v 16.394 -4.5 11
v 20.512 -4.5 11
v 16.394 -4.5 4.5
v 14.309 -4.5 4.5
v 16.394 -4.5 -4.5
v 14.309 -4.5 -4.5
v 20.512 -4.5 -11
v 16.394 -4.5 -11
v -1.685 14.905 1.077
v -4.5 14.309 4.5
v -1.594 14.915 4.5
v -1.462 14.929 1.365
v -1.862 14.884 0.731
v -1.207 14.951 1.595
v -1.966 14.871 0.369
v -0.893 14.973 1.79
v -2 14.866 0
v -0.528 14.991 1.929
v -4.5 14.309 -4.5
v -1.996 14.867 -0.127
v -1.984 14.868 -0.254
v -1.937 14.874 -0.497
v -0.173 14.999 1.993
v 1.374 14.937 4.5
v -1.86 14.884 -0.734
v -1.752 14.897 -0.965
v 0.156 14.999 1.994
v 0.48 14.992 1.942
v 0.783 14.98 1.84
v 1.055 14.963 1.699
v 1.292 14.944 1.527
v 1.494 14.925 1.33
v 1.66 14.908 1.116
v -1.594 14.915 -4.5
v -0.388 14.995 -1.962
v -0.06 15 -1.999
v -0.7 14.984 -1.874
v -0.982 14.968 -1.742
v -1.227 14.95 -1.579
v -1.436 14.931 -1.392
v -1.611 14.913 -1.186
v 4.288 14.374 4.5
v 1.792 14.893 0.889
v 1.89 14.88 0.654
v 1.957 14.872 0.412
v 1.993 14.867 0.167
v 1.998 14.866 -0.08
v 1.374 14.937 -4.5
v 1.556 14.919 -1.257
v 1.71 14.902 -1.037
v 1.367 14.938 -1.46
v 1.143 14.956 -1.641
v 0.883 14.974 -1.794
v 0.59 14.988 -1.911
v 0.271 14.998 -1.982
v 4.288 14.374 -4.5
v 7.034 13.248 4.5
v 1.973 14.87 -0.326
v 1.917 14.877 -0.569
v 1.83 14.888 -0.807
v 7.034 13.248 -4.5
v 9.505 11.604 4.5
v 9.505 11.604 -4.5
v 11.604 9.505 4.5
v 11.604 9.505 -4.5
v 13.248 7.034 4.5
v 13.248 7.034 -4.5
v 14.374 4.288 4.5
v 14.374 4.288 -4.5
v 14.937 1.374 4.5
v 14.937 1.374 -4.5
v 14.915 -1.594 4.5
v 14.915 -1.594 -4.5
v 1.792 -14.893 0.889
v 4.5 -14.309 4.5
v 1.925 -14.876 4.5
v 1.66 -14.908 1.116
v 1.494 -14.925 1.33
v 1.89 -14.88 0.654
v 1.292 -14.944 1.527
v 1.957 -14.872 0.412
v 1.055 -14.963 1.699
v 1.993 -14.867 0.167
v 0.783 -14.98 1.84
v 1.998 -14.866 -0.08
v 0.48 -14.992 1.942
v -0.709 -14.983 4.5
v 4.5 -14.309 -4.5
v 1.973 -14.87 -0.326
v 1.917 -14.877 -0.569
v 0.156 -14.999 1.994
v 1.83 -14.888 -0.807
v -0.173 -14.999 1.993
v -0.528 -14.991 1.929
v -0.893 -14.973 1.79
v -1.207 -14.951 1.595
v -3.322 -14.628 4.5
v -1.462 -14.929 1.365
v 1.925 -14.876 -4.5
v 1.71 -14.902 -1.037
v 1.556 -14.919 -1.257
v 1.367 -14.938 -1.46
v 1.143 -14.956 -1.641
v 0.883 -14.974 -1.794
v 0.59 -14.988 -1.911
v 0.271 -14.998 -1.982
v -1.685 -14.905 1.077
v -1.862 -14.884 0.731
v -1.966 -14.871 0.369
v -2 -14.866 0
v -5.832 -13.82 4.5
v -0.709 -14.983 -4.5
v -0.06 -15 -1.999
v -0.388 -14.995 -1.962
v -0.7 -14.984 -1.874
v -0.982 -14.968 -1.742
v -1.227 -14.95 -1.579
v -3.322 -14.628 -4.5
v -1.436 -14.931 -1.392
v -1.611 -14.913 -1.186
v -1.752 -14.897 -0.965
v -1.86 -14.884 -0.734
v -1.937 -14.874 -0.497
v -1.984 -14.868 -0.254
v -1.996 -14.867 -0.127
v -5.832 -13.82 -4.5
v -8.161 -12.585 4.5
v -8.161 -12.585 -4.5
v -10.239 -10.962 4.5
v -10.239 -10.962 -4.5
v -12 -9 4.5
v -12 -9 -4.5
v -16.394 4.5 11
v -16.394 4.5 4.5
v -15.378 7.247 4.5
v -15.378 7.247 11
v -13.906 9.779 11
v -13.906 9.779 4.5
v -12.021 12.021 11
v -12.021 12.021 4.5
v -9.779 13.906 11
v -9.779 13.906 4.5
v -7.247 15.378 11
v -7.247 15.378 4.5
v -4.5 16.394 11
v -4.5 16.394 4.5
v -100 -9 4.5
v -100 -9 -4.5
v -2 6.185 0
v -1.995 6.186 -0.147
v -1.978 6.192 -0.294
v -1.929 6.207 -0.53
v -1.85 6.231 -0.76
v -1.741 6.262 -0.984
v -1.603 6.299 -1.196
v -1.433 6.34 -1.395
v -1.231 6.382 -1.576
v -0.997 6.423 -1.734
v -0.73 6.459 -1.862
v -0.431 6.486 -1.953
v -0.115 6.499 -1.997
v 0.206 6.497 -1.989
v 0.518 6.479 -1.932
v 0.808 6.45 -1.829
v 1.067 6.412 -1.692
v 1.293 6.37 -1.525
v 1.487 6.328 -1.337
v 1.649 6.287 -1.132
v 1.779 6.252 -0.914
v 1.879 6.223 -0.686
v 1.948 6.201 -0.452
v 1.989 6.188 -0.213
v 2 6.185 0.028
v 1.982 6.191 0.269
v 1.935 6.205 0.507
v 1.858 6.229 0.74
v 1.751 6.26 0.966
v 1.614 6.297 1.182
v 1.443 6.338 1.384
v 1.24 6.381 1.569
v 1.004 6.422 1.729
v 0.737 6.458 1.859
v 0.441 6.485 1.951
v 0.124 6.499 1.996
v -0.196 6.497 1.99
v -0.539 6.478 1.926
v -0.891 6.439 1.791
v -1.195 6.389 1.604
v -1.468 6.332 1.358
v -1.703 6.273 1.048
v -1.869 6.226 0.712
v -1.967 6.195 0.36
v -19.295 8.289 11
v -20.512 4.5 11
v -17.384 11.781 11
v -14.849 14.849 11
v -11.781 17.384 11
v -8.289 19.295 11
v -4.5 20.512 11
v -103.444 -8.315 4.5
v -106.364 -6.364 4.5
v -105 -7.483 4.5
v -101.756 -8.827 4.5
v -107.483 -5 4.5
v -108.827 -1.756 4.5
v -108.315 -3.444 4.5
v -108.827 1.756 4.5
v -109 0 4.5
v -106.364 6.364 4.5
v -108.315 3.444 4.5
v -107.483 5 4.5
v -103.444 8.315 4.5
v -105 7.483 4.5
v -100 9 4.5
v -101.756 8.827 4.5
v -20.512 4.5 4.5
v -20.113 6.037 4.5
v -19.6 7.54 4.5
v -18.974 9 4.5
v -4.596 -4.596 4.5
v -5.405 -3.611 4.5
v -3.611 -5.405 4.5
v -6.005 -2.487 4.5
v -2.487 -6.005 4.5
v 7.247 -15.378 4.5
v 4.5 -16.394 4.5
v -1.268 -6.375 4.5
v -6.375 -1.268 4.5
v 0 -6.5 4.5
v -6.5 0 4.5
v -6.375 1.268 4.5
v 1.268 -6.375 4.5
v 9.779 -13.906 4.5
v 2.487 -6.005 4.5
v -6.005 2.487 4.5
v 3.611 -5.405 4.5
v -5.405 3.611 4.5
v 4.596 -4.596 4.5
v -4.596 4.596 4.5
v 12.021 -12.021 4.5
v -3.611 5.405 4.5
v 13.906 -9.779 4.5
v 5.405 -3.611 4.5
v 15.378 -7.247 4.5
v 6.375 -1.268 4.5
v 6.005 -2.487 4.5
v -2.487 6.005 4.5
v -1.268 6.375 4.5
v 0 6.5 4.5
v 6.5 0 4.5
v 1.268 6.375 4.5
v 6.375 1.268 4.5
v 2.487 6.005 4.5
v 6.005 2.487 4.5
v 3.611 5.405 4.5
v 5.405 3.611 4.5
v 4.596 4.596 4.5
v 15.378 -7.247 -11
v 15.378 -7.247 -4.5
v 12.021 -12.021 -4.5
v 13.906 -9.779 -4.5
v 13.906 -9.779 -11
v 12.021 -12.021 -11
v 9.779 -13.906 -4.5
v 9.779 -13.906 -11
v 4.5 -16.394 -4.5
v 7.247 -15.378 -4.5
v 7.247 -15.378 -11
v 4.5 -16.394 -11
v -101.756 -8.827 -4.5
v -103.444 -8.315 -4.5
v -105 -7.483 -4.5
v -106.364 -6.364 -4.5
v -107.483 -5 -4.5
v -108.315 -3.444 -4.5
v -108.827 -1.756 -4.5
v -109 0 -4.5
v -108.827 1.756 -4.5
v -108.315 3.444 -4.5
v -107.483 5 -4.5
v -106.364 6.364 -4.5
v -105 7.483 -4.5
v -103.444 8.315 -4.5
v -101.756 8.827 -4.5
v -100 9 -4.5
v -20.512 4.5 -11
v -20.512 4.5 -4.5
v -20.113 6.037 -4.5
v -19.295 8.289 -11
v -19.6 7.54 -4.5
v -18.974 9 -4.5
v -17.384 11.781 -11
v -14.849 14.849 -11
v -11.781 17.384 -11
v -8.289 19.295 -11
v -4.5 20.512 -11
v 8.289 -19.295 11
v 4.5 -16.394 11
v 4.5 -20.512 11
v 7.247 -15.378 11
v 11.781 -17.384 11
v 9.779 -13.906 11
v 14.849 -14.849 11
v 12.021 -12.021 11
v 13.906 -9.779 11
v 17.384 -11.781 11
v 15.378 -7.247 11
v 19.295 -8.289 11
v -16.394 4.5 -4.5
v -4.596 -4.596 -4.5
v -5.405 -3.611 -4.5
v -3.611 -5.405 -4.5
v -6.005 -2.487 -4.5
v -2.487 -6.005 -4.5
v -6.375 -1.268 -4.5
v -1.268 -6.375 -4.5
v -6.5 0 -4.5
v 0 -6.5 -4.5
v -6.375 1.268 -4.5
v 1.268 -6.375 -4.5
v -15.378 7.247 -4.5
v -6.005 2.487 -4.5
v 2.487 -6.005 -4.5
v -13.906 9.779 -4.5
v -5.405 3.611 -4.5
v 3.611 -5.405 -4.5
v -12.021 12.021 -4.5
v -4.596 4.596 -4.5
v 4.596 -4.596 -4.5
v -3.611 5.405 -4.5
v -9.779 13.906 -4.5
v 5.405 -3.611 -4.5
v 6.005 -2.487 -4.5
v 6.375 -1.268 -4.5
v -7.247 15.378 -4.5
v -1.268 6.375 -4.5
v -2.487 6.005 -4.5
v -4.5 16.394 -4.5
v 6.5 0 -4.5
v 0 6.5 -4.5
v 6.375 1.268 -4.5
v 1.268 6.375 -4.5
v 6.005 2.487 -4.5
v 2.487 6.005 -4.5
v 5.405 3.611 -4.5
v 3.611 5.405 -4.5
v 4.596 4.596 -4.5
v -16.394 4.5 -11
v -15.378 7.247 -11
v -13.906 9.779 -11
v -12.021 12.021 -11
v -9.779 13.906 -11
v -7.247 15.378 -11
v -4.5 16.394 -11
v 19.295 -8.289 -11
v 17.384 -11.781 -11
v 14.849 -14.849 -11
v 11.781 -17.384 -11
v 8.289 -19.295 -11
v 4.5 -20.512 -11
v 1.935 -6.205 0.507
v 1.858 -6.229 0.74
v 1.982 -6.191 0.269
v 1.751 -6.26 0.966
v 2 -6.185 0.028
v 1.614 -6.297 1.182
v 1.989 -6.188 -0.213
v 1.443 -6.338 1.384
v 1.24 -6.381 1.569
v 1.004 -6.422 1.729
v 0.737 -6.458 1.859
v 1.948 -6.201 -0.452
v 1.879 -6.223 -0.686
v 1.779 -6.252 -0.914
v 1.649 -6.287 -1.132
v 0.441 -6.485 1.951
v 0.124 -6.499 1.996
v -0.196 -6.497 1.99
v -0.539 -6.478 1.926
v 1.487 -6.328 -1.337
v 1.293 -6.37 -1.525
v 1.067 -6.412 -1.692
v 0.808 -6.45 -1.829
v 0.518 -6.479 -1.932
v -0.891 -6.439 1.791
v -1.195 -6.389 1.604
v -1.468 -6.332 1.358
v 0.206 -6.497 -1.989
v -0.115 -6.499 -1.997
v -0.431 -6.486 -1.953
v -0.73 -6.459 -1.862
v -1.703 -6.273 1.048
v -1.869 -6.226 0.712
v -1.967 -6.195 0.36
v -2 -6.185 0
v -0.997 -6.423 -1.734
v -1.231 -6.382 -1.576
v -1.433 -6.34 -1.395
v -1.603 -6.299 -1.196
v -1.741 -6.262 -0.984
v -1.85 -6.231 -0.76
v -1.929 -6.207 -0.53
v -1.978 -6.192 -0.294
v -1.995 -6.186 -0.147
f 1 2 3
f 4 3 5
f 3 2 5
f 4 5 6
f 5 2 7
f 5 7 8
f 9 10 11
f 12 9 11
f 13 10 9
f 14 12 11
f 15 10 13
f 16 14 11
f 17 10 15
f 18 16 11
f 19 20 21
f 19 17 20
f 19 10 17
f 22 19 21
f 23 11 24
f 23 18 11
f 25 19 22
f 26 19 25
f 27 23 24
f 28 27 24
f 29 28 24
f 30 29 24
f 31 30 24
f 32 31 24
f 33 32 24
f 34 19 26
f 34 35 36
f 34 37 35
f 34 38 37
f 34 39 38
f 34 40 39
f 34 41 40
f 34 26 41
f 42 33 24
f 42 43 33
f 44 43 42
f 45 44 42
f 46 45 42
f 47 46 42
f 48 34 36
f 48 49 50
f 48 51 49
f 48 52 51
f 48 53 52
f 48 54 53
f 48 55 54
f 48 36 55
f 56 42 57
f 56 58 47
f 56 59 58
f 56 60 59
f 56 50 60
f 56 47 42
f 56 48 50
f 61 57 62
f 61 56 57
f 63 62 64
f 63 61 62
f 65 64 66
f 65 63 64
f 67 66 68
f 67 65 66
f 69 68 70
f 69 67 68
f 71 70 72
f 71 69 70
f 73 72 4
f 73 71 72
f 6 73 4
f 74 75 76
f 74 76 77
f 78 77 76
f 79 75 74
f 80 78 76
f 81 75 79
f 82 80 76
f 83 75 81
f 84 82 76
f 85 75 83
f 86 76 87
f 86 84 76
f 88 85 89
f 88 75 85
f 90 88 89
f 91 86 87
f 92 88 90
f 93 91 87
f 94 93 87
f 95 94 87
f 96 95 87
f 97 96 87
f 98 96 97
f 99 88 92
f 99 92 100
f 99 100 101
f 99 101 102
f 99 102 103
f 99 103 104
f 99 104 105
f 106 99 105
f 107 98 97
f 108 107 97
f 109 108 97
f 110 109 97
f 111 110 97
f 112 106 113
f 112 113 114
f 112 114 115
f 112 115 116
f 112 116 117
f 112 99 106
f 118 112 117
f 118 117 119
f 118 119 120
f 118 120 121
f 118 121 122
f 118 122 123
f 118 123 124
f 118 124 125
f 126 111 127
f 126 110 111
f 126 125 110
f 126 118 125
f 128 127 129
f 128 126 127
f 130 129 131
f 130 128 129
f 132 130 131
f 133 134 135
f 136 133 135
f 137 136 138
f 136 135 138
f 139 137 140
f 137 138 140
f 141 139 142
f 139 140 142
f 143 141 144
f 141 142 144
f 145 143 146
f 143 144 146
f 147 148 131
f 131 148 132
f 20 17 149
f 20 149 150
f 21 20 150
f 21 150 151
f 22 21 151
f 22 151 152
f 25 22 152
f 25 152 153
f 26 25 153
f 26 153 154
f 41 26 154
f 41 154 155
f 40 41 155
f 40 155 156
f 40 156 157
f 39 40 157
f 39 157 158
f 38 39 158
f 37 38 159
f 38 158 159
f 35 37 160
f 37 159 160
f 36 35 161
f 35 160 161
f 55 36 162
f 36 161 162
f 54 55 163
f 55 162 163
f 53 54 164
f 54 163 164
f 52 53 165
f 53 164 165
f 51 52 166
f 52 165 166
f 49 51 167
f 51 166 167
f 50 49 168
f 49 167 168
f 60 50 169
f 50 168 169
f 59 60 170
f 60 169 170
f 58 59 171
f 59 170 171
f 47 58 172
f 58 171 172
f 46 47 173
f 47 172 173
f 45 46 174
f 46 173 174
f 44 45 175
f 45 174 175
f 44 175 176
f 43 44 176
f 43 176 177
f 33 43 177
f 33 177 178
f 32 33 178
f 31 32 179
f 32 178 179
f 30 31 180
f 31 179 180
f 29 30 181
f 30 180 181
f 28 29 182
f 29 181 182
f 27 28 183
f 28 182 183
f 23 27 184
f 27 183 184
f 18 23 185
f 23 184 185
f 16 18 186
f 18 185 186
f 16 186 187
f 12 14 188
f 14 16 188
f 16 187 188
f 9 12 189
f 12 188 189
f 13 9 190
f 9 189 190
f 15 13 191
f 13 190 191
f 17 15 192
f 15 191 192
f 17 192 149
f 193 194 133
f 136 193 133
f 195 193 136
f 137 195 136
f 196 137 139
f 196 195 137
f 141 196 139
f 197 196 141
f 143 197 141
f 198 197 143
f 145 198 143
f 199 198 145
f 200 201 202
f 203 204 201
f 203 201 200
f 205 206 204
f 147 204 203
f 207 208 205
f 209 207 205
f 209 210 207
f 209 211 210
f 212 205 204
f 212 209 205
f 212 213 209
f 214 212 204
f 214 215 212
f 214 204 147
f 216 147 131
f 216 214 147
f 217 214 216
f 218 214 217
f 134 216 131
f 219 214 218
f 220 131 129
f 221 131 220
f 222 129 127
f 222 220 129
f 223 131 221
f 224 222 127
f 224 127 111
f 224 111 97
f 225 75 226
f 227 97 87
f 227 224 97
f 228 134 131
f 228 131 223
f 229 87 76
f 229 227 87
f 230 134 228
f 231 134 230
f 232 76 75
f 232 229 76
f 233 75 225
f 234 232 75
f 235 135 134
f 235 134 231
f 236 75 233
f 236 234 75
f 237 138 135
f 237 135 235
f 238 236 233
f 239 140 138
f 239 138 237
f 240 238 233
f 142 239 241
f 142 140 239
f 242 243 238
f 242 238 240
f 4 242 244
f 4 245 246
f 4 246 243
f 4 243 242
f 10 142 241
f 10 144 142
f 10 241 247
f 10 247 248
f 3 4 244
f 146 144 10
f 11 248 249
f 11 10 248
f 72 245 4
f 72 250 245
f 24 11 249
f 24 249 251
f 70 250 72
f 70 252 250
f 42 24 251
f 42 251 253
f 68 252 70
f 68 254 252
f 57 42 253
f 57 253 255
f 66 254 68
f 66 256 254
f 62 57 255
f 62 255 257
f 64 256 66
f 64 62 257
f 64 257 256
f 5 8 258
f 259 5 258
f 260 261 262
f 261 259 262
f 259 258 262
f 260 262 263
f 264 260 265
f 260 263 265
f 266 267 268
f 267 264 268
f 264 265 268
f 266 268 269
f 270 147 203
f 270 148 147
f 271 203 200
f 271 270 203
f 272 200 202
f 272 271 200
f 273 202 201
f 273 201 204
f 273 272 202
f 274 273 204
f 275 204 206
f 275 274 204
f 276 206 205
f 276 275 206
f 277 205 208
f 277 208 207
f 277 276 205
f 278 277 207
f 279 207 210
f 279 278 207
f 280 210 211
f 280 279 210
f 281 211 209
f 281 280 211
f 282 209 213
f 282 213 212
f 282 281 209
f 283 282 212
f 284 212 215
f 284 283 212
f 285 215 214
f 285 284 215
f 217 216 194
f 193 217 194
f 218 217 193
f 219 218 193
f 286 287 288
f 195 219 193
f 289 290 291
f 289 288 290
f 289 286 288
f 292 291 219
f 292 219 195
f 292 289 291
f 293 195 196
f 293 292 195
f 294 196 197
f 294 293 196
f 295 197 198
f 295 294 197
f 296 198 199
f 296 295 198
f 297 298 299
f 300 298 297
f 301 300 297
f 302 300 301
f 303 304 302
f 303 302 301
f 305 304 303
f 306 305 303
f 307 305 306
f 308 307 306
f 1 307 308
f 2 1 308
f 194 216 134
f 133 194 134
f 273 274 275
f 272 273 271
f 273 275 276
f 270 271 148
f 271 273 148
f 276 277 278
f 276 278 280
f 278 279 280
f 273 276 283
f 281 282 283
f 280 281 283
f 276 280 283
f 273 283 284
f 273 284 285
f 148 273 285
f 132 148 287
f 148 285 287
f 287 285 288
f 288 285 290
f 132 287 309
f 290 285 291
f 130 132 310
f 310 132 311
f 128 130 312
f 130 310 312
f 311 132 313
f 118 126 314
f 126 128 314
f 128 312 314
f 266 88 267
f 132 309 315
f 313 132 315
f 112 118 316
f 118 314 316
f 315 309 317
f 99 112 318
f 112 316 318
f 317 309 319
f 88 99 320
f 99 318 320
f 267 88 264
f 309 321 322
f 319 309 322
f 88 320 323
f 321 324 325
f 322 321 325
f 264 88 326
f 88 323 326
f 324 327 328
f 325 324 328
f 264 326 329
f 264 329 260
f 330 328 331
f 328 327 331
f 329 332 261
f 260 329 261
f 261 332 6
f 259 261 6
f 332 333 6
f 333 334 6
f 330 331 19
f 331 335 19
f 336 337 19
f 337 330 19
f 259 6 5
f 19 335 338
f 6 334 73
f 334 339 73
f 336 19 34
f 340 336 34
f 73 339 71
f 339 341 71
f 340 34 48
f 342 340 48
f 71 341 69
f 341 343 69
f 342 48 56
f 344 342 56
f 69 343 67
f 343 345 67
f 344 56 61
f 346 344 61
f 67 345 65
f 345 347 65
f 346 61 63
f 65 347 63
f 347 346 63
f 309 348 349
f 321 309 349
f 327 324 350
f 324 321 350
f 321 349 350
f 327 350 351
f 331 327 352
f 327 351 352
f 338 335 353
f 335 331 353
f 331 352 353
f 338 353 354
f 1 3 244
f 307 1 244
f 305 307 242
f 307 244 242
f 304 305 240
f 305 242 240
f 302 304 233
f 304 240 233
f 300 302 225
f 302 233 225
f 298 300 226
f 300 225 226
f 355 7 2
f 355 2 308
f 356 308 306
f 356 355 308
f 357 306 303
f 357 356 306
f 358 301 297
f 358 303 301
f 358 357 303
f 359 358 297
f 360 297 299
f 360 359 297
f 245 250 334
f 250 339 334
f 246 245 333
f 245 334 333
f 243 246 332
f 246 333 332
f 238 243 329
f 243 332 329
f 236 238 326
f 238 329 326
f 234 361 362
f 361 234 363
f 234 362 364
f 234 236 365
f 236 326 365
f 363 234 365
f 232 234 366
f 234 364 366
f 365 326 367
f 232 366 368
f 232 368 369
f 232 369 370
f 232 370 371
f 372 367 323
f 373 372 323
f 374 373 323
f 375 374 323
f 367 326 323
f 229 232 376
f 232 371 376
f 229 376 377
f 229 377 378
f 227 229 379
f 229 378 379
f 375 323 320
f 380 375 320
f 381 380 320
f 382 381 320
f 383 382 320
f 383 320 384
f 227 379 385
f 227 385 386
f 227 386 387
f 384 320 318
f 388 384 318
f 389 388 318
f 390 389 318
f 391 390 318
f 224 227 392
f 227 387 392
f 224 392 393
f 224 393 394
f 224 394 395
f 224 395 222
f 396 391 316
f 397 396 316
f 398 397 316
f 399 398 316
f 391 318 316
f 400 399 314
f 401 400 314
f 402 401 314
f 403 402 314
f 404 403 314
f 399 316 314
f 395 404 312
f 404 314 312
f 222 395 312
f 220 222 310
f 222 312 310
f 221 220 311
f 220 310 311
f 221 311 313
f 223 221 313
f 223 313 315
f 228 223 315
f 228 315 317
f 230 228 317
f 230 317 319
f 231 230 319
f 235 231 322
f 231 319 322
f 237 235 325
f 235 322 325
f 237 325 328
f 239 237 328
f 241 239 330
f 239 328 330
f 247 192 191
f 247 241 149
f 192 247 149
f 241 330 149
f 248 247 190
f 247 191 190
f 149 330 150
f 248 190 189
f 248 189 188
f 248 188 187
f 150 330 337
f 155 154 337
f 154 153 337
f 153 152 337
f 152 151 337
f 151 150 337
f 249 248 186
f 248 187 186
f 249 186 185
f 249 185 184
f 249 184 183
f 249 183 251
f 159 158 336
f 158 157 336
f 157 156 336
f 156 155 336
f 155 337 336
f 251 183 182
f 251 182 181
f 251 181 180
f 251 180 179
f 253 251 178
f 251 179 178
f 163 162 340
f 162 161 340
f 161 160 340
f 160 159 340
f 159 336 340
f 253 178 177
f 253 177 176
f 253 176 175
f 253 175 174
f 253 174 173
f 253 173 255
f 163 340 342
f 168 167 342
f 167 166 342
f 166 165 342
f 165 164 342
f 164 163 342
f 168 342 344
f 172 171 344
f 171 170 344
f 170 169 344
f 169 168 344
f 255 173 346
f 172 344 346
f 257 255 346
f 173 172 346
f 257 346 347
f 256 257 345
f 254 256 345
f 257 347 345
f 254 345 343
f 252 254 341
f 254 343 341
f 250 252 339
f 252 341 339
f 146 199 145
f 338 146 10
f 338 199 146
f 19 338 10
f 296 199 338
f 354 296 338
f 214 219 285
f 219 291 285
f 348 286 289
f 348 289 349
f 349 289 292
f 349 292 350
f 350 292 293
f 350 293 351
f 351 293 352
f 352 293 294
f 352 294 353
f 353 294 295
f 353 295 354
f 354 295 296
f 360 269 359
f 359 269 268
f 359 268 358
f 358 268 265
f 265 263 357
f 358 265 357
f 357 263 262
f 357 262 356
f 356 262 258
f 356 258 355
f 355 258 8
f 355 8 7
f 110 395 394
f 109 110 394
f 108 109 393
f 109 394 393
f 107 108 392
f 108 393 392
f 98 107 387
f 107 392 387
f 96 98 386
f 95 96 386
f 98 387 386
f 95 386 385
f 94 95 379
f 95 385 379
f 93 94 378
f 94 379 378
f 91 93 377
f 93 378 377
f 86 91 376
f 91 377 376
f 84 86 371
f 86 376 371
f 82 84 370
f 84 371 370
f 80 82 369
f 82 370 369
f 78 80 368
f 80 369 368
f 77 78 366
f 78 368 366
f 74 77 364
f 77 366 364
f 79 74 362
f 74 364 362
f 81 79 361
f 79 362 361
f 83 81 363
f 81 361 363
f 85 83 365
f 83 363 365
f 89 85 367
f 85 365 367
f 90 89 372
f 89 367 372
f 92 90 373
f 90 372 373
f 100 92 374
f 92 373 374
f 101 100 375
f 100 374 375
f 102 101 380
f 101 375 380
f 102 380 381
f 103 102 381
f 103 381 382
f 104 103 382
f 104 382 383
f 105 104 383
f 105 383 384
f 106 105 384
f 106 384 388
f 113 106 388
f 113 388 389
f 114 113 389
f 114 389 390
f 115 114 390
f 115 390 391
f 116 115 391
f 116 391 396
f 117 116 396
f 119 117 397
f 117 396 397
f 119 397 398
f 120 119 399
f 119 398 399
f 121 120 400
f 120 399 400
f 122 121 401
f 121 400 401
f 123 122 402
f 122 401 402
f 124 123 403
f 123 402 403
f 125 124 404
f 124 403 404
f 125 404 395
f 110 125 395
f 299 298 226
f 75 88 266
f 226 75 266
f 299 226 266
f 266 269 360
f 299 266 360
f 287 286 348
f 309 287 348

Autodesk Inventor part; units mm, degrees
ref_plane "YZ Plane" through (0, 0, 0) normal (1, 0, 0) x (0, 1, 0)
ref_plane "XZ Plane" through (0, 0, 0) normal (0, 1, 0) x (-1, 0, 0)
ref_plane "XY Plane" through (0, 0, 0) normal (0, 0, 1) x (1, 0, 0)
sketch "Sketch1" plane through (0, 0, 0) normal (0, 0, 1) x (1, 0, 0)
  line L0 (-122.1855, 0) -> (62.4119, 0) projected
  line L1 (0, -27.4264) -> (0, 36.5685) projected
  circle A0 centre (0, 0) radius 6.5
  line L2 (-4.5, 20.5122) -> (-4.5, 14.3091)
  line L3 (-20.5122, 4.5) -> (-14.3091, 4.5)
  line L4 (4.5, -14.3091) -> (4.5, -20.5122)
  line L5 (20.5122, -4.5) -> (14.3091, -4.5)
  arc A1 (-4.5, 20.5122) -> (-20.5122, 4.5) centre (0, 0) ccw
  arc A2 (4.5, -20.5122) -> (20.5122, -4.5) centre (0, 0) ccw
  arc A3 (-4.5, 16.3936) -> (-16.3936, 4.5) centre (0, 0) ccw
  arc A4 (4.5, -16.3936) -> (16.3936, -4.5) centre (0, 0) ccw
  arc A5 (-14.3091, 4.5) -> (4.5, -14.3091) centre (0, 0) ccw
  arc A6 (14.3091, -4.5) -> (-4.5, 14.3091) centre (0, 0) ccw
  line L6 (-18.9737, 9) -> (-100, 9)
  arc A7 (-100, 9) -> (-100, -9) centre (-100, 0) ccw
  line L7 (-100, -9) -> (-12, -9)
  dimension "d0" = 13
  dimension "d1" = 30
  dimension "d2" = 34
  dimension "d3" = 42
  dimension "d4" = 4.5
  dimension "d5" = 4.5
  dimension "d6" = 100
  dimension "d7" = 9
extrude "Extrusion1" add sketch "Sketch1" along normal mid plane 9 contours A7 L6 A1 L3 A5 L0 | L0 A5 L7 A7 | A5 L3 A3 L2 A6 L1 A0 L0 | L0 A0 L1 A5 | L1 A6 L0 A0 | A0 L0 A6 L5 A4 L4 A5 L1
extrude "Extrusion2" add sketch "Sketch1" along normal mid plane 22 contours A1 L2 A3 L3 | A4 L5 A2 L4
sketch "Sketch2" plane through (0, 0, 0) normal (0, 1, 0) x (-1, 0, 0)
  line L0 (2.4, 0) -> (-3.2, 0) projected
  line L1 (0, -2.4) -> (0, 3.2) projected
  circle A0 centre (0, 0) radius 2
  dimension "d12" = 4
extrude "Extrusion3" cut sketch "Sketch2" along normal through all both and the other way through all
properties part number "Handle" material "Steel, Mild"
